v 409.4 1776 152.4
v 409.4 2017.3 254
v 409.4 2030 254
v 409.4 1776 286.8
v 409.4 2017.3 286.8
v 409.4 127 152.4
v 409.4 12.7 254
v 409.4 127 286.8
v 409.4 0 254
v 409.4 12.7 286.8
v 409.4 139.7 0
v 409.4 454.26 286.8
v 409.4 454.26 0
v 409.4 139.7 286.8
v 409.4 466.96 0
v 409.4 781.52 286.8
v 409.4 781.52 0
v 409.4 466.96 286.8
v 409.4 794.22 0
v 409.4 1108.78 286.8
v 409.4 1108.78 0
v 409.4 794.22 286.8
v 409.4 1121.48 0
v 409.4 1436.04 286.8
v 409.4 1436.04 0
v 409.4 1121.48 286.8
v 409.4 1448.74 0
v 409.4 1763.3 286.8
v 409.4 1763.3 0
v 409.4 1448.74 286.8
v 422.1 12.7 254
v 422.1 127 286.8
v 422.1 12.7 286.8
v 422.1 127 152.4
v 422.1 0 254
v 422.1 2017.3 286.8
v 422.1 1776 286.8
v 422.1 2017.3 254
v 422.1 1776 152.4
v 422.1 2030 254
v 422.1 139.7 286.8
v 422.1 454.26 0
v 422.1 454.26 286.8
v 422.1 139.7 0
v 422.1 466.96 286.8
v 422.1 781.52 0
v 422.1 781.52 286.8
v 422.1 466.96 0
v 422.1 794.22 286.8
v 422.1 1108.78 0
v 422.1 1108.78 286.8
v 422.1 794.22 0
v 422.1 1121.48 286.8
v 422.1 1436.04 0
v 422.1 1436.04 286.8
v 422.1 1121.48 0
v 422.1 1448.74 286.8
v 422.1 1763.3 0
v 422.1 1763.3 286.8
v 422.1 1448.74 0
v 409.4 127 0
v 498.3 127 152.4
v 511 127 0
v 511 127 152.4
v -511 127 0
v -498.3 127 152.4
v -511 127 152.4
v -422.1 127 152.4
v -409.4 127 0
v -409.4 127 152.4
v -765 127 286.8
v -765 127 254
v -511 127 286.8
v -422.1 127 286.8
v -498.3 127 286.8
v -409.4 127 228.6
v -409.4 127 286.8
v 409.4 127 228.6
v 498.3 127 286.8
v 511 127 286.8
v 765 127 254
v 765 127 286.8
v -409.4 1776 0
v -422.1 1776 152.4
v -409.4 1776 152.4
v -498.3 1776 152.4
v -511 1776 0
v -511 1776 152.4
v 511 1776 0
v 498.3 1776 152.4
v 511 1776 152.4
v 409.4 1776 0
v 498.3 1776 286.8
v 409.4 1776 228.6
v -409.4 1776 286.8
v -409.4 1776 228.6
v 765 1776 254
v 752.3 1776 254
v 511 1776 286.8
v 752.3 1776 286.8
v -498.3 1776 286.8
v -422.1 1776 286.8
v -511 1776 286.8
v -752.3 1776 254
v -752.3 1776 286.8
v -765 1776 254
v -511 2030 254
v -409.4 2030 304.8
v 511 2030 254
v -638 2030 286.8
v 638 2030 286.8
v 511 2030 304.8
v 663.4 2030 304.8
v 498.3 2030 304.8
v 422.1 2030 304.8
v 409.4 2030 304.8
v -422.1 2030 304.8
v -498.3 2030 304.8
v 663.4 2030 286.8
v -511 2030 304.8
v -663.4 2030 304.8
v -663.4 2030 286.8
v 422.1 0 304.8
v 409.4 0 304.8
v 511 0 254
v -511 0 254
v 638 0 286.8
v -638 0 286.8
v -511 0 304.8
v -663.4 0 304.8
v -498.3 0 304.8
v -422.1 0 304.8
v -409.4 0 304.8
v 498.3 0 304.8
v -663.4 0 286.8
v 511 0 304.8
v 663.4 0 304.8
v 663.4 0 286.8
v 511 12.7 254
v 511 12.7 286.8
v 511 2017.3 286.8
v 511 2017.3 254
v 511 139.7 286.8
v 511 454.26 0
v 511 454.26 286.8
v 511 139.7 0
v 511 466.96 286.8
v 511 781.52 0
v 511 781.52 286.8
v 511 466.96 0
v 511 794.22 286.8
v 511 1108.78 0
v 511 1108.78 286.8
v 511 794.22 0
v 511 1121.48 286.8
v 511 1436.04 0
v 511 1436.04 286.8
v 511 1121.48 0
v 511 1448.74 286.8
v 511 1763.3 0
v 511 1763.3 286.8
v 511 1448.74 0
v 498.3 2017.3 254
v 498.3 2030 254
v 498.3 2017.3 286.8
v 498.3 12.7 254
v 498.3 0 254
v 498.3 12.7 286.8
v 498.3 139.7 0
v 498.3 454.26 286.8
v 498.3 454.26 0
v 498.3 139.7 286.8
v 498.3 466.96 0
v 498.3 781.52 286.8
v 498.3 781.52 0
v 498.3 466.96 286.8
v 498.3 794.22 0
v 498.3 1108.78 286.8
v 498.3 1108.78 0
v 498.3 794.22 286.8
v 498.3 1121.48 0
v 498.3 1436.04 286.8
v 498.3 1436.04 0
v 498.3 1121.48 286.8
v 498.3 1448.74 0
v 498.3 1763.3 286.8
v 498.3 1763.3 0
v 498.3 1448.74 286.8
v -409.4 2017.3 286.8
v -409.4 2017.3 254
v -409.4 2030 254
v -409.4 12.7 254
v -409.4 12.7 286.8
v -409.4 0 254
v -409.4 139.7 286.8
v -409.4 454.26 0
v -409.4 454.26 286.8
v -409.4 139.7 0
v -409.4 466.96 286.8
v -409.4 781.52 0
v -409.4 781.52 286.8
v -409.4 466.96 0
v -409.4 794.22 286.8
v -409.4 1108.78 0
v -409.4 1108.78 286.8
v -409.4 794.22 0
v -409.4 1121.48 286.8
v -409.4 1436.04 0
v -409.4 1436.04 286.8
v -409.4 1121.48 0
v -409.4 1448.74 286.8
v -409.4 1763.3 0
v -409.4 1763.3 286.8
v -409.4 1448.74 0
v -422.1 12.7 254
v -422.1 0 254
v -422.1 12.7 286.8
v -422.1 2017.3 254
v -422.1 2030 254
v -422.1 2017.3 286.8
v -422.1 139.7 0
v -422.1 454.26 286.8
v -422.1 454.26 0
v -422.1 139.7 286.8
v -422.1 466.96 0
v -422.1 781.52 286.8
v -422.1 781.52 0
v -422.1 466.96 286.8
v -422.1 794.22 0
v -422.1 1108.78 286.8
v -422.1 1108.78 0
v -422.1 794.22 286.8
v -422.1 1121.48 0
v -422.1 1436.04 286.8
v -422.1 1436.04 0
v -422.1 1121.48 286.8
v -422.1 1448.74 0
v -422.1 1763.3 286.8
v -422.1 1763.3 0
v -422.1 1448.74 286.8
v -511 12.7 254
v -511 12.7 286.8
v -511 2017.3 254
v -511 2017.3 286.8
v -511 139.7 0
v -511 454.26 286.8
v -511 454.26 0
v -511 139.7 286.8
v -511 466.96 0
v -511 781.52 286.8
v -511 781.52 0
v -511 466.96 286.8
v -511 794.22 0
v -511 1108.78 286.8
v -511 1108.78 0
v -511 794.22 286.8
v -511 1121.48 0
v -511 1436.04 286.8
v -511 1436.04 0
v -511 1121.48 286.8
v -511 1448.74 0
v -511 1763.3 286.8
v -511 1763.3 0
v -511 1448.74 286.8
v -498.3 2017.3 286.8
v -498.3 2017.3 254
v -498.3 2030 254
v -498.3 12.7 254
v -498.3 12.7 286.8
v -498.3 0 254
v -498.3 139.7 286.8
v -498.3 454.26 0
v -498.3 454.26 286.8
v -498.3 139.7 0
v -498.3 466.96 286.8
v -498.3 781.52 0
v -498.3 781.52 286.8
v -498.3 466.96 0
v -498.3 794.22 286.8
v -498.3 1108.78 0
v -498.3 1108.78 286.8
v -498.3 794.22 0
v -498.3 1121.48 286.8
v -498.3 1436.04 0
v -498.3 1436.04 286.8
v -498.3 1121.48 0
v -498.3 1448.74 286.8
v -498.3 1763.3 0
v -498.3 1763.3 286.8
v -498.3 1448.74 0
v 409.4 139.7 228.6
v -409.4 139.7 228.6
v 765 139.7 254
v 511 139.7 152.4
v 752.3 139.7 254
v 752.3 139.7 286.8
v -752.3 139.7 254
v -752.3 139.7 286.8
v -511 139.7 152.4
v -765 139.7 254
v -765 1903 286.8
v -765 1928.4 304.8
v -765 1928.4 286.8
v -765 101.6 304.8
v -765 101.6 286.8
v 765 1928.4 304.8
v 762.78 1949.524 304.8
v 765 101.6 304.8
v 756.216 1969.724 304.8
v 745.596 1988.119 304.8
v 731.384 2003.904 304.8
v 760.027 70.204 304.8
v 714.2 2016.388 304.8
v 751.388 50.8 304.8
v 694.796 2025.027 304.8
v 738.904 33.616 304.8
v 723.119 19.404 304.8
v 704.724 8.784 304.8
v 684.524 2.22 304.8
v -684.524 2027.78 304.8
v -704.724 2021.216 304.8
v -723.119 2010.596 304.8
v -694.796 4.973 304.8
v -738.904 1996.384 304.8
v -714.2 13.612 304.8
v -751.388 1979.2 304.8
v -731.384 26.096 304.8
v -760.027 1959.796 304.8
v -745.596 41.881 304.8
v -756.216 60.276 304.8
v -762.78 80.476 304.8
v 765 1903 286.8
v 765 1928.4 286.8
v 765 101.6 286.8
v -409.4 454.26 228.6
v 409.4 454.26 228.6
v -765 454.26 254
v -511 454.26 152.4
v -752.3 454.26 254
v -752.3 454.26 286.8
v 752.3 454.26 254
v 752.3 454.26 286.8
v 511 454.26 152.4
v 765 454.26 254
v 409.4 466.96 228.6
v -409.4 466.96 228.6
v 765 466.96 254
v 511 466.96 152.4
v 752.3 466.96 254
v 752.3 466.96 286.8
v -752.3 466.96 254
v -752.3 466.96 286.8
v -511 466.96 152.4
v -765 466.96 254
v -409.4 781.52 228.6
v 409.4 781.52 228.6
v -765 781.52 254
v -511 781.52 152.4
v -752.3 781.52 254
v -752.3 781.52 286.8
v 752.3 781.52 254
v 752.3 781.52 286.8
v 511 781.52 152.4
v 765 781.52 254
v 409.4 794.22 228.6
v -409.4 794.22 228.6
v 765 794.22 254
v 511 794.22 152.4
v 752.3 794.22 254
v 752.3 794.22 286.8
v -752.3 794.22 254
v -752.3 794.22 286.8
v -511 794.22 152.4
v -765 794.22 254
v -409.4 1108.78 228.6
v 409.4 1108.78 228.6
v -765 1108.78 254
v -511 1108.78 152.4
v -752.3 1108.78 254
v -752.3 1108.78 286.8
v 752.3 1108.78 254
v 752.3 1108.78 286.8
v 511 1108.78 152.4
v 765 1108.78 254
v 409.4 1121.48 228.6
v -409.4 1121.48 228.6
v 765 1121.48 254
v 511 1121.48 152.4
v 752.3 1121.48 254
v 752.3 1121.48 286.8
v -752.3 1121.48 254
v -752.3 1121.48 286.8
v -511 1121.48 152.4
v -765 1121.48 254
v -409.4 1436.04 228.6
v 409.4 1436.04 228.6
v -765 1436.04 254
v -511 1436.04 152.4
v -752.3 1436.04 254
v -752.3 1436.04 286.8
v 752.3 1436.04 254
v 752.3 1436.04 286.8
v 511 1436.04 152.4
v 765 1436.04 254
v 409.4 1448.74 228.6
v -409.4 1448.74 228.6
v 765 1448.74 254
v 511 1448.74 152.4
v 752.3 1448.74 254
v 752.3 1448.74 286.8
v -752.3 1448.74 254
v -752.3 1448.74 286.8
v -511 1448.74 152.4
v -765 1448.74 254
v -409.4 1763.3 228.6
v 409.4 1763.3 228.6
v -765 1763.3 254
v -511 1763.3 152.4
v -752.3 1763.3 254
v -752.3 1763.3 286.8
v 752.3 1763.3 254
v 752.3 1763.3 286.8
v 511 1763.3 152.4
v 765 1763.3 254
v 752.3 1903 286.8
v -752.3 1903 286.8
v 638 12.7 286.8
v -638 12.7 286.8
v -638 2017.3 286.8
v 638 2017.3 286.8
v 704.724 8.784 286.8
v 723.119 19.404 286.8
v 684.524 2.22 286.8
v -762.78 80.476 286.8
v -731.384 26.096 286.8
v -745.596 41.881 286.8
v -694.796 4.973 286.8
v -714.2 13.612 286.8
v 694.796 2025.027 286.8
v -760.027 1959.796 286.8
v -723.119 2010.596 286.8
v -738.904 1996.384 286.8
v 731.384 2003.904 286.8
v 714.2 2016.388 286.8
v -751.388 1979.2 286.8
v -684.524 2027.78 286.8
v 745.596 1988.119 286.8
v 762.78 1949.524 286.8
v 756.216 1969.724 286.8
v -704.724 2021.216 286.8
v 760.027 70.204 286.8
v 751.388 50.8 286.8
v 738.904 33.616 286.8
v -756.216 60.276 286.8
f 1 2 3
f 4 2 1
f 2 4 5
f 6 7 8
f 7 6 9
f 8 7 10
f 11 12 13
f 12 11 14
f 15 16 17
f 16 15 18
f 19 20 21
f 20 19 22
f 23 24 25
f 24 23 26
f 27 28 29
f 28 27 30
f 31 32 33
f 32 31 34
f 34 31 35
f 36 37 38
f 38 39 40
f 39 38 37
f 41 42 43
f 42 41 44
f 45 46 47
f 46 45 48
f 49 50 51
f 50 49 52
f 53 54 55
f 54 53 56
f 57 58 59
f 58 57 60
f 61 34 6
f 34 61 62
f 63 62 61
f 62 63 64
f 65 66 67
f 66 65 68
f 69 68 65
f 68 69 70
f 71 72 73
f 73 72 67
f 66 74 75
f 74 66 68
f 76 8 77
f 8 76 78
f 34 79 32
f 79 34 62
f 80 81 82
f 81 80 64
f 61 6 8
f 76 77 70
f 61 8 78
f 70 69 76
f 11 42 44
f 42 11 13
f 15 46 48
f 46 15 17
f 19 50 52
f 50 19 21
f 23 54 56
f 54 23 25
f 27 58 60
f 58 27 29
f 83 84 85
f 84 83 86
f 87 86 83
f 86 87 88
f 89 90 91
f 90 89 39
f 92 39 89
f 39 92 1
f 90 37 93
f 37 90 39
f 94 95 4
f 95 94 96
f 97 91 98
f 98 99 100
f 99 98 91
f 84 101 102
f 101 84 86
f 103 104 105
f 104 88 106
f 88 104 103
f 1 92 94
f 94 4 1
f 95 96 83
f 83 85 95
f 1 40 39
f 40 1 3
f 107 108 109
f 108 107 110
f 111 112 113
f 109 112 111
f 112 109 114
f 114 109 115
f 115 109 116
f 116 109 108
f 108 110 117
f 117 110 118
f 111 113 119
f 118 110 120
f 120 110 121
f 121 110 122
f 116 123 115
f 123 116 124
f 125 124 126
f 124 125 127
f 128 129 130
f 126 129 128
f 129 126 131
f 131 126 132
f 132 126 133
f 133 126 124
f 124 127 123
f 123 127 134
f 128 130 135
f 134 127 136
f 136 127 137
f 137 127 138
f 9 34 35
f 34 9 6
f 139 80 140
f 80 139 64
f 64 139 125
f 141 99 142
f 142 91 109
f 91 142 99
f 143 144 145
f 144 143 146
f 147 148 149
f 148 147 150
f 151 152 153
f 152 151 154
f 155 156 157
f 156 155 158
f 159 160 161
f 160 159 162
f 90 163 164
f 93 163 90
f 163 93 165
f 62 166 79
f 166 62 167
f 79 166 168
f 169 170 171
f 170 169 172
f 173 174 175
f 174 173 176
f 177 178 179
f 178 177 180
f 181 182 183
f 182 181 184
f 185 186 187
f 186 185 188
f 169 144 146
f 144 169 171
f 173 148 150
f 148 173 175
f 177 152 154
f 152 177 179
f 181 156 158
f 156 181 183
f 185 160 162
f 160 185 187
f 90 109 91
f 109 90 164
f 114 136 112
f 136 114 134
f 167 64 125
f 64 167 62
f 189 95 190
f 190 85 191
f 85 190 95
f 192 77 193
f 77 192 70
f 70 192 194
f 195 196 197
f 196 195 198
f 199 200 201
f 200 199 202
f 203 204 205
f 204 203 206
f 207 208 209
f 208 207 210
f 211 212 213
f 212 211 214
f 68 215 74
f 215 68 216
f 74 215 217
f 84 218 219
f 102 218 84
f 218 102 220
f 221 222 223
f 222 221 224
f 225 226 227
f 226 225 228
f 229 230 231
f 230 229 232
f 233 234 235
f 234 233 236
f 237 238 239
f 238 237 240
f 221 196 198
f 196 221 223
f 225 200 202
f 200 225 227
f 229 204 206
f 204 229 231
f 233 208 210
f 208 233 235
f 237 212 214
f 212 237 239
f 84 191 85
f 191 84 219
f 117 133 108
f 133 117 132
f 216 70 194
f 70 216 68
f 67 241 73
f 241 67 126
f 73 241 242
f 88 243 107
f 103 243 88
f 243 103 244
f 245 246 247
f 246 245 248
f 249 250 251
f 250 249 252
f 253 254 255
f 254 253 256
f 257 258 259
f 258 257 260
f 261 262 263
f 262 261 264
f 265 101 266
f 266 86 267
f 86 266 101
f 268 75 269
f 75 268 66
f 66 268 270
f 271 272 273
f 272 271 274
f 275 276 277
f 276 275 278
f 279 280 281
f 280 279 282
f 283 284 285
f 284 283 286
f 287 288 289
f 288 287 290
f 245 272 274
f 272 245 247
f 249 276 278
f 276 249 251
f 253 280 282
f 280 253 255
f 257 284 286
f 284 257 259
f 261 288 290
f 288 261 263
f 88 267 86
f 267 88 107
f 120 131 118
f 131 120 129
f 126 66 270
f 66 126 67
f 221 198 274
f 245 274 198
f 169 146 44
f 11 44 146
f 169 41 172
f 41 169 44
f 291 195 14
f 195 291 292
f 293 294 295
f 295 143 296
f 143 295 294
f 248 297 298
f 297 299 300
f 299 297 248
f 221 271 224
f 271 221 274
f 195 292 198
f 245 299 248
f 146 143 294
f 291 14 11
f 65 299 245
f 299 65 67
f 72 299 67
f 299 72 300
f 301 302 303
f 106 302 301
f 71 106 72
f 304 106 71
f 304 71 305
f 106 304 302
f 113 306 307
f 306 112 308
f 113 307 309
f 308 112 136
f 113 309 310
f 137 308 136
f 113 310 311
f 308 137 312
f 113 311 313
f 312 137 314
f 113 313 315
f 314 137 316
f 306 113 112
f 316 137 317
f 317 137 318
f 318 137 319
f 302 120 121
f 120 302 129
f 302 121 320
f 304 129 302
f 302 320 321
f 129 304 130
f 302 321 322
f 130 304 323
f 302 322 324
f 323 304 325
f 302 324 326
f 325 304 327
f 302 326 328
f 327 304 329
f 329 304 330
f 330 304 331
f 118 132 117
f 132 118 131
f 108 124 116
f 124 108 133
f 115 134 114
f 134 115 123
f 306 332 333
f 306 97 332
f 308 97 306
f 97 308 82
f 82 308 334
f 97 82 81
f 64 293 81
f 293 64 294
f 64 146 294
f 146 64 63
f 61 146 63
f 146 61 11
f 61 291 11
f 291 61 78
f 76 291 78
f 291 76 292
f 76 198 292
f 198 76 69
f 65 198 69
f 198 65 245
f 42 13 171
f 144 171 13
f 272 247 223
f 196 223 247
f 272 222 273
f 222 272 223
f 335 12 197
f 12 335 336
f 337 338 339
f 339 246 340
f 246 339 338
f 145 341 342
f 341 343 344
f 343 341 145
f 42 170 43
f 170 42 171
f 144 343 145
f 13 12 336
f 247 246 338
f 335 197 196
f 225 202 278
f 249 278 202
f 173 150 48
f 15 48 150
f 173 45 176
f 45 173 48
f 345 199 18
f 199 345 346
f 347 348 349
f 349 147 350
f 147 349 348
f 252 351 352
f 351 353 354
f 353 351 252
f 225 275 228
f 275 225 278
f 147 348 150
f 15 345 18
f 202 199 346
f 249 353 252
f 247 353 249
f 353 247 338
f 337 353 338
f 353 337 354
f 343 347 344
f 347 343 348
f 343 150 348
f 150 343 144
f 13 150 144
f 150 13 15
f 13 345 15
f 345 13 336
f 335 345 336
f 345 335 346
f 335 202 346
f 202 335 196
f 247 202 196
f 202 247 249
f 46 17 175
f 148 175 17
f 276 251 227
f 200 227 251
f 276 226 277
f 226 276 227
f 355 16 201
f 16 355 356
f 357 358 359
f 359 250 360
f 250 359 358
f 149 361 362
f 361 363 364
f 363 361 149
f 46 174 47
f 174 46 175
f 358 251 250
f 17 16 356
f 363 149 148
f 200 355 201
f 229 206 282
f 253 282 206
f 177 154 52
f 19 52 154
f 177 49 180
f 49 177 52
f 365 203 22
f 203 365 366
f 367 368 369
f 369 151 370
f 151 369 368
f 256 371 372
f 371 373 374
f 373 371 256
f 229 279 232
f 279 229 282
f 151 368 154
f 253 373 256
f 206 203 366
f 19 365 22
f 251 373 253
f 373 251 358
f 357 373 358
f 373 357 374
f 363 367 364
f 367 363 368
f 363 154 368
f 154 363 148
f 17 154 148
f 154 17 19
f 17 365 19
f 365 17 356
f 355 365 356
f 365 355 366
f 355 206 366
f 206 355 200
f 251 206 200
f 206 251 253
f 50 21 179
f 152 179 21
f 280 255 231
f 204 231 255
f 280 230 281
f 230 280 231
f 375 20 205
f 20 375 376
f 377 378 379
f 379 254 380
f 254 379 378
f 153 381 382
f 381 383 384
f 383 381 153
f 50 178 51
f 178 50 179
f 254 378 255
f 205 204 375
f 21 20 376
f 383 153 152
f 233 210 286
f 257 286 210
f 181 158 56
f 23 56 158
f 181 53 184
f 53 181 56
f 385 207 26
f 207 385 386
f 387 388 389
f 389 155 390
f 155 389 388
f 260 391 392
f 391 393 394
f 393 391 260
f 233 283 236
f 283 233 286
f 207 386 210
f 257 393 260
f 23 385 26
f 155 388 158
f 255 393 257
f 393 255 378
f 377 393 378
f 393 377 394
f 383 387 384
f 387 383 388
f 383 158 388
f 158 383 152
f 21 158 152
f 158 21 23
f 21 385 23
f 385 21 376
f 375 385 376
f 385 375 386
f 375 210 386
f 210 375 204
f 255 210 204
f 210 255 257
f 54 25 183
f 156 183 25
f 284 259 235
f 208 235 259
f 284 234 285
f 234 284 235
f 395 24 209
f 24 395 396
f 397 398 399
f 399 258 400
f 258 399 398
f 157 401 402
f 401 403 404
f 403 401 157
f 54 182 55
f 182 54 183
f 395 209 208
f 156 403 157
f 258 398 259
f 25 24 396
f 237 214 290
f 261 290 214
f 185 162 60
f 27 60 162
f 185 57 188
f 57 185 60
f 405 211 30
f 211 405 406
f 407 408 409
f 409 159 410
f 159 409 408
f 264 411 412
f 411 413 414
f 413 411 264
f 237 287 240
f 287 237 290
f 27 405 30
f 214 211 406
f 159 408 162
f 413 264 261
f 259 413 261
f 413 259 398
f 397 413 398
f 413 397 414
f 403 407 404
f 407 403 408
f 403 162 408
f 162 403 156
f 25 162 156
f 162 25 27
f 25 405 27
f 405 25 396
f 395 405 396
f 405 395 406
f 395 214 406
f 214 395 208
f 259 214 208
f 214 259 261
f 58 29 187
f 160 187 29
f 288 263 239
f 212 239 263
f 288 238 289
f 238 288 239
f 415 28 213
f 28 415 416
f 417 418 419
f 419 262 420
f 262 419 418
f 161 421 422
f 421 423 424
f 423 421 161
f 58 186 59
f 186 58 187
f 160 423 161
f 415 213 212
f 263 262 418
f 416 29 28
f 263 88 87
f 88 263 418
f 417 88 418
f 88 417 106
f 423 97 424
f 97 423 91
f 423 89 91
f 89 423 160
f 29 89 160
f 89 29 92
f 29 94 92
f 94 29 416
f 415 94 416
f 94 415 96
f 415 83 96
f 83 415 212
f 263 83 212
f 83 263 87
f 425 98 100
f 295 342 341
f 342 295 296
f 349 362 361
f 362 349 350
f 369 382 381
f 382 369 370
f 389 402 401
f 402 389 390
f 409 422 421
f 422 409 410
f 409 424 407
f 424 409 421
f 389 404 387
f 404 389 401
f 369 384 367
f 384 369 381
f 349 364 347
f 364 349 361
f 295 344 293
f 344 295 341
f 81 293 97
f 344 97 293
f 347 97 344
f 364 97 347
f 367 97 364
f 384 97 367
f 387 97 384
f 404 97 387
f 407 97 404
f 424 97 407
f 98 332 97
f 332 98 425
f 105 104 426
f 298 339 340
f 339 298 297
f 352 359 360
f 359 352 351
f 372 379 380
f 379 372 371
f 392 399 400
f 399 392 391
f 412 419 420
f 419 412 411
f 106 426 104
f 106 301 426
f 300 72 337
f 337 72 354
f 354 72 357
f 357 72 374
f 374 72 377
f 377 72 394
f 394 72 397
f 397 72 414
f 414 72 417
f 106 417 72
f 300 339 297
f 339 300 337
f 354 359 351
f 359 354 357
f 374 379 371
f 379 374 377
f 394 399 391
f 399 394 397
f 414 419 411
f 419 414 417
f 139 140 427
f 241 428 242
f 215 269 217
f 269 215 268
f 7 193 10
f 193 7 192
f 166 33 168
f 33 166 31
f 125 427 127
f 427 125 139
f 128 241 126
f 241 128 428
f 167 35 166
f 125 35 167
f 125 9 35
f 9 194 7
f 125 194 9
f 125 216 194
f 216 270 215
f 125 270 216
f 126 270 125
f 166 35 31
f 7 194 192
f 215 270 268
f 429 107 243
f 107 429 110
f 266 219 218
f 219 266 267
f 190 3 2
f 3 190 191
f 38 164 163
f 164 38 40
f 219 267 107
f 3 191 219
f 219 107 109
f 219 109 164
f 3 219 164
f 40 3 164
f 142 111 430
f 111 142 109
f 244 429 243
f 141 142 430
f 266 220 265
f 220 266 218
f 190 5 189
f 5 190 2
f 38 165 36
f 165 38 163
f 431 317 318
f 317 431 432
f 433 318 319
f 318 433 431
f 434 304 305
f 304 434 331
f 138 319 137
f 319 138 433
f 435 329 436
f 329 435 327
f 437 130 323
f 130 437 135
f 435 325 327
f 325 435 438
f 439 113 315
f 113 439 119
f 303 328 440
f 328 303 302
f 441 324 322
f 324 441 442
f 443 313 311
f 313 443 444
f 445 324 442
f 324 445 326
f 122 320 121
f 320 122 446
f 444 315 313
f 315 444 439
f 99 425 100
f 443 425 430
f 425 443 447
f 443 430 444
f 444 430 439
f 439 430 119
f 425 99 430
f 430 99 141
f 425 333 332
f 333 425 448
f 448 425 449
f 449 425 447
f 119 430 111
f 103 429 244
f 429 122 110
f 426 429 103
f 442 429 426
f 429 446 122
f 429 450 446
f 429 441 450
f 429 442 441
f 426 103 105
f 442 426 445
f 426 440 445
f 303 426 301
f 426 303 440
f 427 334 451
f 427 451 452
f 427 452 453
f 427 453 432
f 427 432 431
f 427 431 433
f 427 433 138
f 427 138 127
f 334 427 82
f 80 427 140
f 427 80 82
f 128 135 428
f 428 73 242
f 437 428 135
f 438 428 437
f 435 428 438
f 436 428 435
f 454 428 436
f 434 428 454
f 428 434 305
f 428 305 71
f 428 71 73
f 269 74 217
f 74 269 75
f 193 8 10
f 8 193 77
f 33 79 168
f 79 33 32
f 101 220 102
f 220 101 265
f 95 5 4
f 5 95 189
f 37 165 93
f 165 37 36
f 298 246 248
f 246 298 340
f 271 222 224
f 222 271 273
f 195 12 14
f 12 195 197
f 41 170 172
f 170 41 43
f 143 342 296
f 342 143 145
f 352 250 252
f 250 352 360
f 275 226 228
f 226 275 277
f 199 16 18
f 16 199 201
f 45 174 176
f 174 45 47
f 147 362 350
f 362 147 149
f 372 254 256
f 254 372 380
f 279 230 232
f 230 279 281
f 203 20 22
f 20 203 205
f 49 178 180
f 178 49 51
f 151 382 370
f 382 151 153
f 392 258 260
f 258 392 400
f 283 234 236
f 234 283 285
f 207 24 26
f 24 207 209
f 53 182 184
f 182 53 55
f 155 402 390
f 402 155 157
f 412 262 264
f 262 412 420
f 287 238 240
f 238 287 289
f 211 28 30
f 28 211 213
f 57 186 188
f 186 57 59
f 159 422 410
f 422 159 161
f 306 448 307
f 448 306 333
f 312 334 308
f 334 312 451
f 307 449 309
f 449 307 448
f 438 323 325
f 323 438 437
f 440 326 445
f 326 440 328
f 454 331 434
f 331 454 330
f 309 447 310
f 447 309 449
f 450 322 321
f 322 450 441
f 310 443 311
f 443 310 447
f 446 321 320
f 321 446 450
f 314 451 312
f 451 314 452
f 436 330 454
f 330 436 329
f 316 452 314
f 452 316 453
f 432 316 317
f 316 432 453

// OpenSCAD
pad=0.1;
in=25.4;
zero=0.01;

bed_x=1530;
bed_y=2030;
bed_z=12*in;
bed_r=5*in;

mattress_z=6*in;
mattress_r=2*in;

overhang=10*in;
back_overhang=bed_r;

leg_x=4*in;

spine=3*in;
spines=6;

bed_wood=18;
wood=in/2;

edge=2*in;
inner=spine*2;
tip=overhang/2;
total_leg_x=bed_x-overhang*2;

module corner(r) {
	offset(r*2)
	offset(-r*2)
	children();
}

module wood(w=wood) {
	linear_extrude(height=w)
	children();
}

module dirror_y(y=0) {
	children();
	translate([0,y])
	mirror([0,1])
	children();

}

module dirror_x(x=0) {
	children();
	translate([x,0])
	mirror([1,0])
	children();

}

module bed() {
	translate([-bed_x/2,0])
	corner(mattress_r)
	square([bed_x,bed_y]);
}

module assembled() {
	color("blue")
	translate([0,0,bed_z-bed_wood])
	wood(bed_wood)
	bed();

	color("cyan")
	dirror_x()
	translate([bed_x/2-overhang-leg_x,back_overhang,bed_z])
	dirror_x(leg_x)
	rotate([0,90])
	wood()
	leg_side();

	for(y=[back_overhang:spine_gap:bed_y-overhang])
	translate([0,y,bed_z])
	rotate([-90,0])
	wood()
	spine();

	dirror_x()
	translate([bed_x/2,back_overhang,bed_z])
	rotate([-90,0,90])
	wood()
	side_edge();

	dirror_y(bed_y)
	translate([0,0,bed_z])
	rotate([-90,0])
	wood()
	end_edge();
}

module end_edge() {
	hull() {
		translate([-total_leg_x/2,0])
		square([total_leg_x,edge]);
		translate([-tip-total_leg_x/2,0])
		square([total_leg_x+tip*2,bed_wood]);
	}
}

module side_edge() {
	hull() {
		square([leg_y,edge]);
		square([leg_y+tip,bed_wood]);
	}
}

module spine() {
	translate([overhang-bed_x/2,0])
	square([bed_x-overhang*2,spine]);

	dirror_x()
	translate([bed_x/2-overhang-leg_x,0])
	square([leg_x,leg_z]);

	dirror_x()
	translate([bed_x/2-overhang-leg_x,0])
	hull() {
		square([leg_x,inner]);
		square([leg_x+overhang,edge]);
	}
}

leg_y=bed_y-overhang-back_overhang;
leg_z=bed_z;

spine_gap=(leg_y-wood)/(spines-1);

module leg_side() {
	square([leg_z,leg_y]);

	hull() {
		translate([0,-back_overhang])
		square([edge,bed_y]);
		square([inner,leg_y]);
	}
}

assembled();
